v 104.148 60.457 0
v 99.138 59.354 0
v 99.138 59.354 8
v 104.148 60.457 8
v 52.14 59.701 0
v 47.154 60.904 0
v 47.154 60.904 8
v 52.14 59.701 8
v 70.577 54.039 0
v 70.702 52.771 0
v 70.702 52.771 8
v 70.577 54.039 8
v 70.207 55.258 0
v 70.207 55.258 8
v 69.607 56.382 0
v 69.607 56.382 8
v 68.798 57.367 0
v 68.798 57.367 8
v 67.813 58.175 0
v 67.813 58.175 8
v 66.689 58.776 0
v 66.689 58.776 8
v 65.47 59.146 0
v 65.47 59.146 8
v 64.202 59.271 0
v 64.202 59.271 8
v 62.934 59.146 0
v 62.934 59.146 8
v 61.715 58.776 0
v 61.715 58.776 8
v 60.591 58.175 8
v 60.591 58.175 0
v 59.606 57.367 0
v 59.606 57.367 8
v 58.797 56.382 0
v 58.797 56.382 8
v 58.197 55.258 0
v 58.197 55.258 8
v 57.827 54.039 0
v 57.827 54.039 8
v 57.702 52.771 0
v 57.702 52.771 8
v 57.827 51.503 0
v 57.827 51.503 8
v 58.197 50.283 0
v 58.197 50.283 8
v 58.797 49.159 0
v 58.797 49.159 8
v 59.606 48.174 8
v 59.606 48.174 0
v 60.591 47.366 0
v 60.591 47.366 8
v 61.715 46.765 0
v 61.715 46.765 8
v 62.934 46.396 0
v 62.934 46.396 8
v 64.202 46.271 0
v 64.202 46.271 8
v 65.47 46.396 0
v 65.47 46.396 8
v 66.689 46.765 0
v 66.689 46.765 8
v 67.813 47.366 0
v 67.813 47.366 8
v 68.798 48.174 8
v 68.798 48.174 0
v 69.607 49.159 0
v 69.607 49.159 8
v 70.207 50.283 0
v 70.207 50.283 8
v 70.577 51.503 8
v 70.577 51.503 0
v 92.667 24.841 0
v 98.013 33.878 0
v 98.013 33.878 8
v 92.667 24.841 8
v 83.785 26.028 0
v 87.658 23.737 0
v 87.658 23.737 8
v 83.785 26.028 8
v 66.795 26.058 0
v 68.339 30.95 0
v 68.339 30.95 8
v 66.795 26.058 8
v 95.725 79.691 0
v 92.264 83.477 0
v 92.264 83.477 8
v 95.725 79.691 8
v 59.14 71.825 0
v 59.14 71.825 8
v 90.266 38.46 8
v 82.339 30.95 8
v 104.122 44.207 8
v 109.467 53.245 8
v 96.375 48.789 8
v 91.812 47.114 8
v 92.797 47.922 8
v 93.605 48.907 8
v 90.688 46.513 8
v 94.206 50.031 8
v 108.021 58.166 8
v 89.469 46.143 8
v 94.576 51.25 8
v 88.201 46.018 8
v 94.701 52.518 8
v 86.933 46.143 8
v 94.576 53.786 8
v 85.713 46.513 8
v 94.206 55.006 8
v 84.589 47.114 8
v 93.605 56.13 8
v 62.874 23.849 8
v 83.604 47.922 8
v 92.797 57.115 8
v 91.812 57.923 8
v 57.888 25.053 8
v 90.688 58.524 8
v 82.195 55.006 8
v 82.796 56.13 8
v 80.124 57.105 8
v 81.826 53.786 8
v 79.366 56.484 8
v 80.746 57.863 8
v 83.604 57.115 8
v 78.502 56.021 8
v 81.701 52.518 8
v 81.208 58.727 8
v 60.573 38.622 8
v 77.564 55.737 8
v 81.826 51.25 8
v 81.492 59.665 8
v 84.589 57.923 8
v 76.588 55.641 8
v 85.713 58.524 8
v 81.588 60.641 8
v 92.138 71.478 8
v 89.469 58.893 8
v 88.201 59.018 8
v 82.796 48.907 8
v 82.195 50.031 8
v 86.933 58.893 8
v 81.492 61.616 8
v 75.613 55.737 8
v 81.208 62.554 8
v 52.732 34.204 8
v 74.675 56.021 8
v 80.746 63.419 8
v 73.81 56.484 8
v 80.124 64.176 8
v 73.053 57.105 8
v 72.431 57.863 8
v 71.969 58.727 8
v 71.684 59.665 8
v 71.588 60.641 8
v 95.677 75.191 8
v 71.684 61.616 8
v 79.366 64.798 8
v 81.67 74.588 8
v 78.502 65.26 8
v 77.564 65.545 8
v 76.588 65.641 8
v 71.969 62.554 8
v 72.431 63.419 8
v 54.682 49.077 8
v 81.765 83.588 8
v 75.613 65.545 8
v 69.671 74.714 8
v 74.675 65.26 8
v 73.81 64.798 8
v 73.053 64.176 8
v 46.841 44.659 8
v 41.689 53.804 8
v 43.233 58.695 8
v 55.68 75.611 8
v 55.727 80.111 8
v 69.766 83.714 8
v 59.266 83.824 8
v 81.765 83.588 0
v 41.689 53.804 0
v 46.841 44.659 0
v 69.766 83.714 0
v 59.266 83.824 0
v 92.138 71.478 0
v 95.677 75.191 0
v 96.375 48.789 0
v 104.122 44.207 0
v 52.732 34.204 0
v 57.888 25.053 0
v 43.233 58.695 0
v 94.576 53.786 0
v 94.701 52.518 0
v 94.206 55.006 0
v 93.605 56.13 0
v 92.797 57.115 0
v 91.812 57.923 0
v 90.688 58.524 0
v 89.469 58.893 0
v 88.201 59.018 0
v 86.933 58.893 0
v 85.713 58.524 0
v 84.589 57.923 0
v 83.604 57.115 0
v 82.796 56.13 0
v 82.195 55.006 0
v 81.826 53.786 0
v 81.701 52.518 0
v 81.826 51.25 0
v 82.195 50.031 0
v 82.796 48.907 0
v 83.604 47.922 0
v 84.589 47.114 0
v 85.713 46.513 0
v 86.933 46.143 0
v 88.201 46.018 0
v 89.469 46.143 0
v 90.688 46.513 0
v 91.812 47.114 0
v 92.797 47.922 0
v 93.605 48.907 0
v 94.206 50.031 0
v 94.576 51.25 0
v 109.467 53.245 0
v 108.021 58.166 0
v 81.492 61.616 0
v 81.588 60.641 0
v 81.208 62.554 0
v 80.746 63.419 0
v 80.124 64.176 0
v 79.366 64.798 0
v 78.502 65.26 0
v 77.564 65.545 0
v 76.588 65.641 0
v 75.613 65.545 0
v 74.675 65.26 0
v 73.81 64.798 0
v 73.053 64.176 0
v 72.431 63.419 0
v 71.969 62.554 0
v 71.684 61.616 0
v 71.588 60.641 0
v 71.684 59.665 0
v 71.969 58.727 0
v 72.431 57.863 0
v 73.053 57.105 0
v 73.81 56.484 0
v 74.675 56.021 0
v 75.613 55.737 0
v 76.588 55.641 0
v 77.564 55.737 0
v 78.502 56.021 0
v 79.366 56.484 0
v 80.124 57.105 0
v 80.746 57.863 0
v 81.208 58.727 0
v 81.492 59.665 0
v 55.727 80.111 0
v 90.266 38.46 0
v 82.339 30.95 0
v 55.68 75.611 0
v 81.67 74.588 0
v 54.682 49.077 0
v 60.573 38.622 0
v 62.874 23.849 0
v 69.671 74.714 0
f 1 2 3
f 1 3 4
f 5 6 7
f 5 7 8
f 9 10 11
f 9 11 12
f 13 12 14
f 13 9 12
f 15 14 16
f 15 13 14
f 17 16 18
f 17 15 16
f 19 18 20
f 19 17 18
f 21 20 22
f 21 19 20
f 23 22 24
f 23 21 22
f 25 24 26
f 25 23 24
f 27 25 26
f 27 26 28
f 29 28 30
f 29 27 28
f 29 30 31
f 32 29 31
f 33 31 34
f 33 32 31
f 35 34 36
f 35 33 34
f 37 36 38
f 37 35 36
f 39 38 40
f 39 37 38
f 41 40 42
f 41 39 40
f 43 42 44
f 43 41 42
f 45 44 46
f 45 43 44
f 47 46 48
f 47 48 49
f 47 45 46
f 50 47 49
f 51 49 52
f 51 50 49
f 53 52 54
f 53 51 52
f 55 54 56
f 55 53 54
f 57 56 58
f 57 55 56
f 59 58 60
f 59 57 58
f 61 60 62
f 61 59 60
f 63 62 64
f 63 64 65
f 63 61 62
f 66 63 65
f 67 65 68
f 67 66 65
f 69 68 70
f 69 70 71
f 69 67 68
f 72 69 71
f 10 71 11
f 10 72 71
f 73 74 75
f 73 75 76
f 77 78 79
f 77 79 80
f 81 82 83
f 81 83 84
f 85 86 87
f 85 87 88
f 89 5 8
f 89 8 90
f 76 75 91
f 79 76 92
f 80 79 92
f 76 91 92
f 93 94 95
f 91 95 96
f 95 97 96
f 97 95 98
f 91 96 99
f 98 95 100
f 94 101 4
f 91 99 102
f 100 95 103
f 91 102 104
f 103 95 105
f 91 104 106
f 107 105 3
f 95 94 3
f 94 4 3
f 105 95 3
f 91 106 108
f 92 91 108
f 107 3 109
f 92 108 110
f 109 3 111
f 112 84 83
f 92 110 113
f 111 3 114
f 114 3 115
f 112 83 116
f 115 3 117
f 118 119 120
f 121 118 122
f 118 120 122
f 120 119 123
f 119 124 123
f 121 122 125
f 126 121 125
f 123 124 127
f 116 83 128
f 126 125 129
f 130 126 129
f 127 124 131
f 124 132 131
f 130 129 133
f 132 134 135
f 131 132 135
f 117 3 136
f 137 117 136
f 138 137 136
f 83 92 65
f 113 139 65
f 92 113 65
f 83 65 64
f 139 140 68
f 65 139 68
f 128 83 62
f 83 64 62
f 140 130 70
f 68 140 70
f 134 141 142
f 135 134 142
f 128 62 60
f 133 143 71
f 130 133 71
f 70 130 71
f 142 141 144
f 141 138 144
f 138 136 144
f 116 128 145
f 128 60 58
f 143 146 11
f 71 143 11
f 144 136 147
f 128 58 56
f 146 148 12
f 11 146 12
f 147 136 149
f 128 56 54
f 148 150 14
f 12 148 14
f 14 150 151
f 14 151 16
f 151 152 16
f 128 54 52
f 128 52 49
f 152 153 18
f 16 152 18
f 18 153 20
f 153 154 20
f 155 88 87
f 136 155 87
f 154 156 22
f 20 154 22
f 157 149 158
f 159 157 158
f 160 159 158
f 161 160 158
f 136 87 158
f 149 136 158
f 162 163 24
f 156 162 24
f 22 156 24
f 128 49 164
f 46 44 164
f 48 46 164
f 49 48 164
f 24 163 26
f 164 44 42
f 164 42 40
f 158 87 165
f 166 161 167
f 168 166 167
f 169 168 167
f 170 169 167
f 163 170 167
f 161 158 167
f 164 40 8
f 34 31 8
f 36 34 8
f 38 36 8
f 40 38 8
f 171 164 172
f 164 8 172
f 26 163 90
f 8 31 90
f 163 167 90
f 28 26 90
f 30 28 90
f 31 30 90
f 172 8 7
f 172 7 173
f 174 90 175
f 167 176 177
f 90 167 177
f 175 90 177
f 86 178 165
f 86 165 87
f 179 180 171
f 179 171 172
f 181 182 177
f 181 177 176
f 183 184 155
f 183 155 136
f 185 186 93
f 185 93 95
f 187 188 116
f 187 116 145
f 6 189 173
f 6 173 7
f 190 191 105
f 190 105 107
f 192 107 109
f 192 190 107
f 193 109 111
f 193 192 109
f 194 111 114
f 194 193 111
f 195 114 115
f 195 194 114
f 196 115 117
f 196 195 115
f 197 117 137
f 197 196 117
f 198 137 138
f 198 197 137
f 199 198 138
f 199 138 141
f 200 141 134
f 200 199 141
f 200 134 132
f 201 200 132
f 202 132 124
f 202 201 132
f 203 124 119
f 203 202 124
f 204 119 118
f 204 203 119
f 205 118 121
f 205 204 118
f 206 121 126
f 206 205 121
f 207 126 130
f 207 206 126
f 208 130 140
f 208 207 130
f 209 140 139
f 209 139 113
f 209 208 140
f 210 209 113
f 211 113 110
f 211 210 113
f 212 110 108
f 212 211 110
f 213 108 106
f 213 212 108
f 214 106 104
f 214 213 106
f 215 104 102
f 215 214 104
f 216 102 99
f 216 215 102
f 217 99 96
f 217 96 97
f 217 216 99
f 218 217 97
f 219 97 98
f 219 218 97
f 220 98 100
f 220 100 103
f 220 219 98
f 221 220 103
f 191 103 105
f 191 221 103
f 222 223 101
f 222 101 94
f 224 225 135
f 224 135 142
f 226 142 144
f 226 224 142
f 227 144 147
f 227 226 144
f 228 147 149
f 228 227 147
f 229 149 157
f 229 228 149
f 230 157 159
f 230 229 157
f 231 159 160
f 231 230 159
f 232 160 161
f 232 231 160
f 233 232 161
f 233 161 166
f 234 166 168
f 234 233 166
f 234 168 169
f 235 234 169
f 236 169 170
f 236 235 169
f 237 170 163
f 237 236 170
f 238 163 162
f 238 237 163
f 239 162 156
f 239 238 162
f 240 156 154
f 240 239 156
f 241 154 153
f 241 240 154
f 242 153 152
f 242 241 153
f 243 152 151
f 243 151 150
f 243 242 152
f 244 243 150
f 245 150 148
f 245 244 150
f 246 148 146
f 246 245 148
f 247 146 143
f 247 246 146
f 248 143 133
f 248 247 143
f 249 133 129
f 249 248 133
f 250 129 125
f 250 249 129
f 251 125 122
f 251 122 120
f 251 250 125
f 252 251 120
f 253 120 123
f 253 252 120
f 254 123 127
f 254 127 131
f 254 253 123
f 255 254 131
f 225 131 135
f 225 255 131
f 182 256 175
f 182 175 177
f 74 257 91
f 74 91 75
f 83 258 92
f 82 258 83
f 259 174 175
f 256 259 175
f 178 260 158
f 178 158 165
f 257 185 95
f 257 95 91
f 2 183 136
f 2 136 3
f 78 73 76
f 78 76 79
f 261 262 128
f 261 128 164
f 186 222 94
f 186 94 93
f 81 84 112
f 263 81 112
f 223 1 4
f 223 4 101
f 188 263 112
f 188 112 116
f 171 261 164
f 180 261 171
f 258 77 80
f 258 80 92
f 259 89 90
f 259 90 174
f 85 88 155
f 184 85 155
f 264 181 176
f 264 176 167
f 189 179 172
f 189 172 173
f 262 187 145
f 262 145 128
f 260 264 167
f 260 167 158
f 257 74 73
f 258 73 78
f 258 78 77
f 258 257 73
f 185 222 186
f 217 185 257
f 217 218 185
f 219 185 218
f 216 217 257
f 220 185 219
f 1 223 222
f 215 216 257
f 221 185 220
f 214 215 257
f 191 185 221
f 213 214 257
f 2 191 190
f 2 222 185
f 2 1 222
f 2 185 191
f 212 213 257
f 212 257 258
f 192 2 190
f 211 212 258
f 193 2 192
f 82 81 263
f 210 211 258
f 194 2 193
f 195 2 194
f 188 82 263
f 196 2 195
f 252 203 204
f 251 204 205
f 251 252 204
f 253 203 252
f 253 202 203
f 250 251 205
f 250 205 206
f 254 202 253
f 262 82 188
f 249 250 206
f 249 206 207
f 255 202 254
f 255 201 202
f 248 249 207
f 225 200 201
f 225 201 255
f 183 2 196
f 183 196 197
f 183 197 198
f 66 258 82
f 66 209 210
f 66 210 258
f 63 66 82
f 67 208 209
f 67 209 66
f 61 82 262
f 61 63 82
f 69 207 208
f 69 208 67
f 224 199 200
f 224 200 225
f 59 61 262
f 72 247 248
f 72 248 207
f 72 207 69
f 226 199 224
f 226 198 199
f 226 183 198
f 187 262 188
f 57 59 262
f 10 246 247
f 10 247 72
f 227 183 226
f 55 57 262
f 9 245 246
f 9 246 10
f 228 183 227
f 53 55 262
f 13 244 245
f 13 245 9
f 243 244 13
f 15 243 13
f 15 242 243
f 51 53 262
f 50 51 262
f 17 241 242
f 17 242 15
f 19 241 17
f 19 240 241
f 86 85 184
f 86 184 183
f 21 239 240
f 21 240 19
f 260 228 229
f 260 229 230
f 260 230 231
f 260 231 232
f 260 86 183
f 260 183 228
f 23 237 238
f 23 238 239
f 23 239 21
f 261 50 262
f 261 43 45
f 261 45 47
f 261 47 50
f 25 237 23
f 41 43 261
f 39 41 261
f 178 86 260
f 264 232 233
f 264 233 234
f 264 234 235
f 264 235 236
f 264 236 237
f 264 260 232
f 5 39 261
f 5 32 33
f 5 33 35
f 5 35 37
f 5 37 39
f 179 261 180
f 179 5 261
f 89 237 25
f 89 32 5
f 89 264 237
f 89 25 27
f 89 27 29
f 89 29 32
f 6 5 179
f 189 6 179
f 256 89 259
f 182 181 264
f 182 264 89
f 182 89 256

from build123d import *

# Parameters (mm, degrees)
SKETCH_R      = 5
SKETCH_R_2    = 6.5
EXTRUDE_DEPTH = 8


with BuildPart() as part:
    # Sketch → Extrude (new body)
    with BuildSketch(Plane.XY):
        Polygon((92.138212, 71.477997), (99.138212, 59.353641), (104.147683, 60.457133), (108.020931, 58.166292), (109.466872, 53.244732), (104.121576, 44.207154), (96.375081, 48.788836), (90.266171, 38.460176), (98.012666, 33.878494), (92.66737, 24.840916), (87.657898, 23.737425), (83.784651, 26.028266), (82.33871, 30.949826), (68.33871, 30.949826), (66.794519, 26.058201), (62.873968, 23.849291), (57.887594, 25.052863), (52.731628, 34.204082), (60.572729, 38.621903), (54.682302, 49.076704), (46.841201, 44.658884), (41.688919, 53.803566), (43.23311, 58.695191), (47.15366, 60.904101), (52.140035, 59.700529), (59.140035, 71.824885), (55.679647, 75.611469), (55.72695, 80.11122), (59.266176, 83.824222), (69.765596, 83.713849), (69.67099, 74.714346), (81.670327, 74.588205), (81.764933, 83.587708), (92.264353, 83.477334), (95.72474, 79.69075), (95.677437, 75.190999), align=None)
        with Locations((76.588238, 60.640856)):
            Circle(SKETCH_R, mode=Mode.SUBTRACT)
        with Locations((64.201959, 52.770623)):
            Circle(SKETCH_R_2, mode=Mode.SUBTRACT)
        with Locations((88.200633, 52.51834)):
            Circle(SKETCH_R_2, mode=Mode.SUBTRACT)
    extrude(amount=EXTRUDE_DEPTH)


solid = part.part
